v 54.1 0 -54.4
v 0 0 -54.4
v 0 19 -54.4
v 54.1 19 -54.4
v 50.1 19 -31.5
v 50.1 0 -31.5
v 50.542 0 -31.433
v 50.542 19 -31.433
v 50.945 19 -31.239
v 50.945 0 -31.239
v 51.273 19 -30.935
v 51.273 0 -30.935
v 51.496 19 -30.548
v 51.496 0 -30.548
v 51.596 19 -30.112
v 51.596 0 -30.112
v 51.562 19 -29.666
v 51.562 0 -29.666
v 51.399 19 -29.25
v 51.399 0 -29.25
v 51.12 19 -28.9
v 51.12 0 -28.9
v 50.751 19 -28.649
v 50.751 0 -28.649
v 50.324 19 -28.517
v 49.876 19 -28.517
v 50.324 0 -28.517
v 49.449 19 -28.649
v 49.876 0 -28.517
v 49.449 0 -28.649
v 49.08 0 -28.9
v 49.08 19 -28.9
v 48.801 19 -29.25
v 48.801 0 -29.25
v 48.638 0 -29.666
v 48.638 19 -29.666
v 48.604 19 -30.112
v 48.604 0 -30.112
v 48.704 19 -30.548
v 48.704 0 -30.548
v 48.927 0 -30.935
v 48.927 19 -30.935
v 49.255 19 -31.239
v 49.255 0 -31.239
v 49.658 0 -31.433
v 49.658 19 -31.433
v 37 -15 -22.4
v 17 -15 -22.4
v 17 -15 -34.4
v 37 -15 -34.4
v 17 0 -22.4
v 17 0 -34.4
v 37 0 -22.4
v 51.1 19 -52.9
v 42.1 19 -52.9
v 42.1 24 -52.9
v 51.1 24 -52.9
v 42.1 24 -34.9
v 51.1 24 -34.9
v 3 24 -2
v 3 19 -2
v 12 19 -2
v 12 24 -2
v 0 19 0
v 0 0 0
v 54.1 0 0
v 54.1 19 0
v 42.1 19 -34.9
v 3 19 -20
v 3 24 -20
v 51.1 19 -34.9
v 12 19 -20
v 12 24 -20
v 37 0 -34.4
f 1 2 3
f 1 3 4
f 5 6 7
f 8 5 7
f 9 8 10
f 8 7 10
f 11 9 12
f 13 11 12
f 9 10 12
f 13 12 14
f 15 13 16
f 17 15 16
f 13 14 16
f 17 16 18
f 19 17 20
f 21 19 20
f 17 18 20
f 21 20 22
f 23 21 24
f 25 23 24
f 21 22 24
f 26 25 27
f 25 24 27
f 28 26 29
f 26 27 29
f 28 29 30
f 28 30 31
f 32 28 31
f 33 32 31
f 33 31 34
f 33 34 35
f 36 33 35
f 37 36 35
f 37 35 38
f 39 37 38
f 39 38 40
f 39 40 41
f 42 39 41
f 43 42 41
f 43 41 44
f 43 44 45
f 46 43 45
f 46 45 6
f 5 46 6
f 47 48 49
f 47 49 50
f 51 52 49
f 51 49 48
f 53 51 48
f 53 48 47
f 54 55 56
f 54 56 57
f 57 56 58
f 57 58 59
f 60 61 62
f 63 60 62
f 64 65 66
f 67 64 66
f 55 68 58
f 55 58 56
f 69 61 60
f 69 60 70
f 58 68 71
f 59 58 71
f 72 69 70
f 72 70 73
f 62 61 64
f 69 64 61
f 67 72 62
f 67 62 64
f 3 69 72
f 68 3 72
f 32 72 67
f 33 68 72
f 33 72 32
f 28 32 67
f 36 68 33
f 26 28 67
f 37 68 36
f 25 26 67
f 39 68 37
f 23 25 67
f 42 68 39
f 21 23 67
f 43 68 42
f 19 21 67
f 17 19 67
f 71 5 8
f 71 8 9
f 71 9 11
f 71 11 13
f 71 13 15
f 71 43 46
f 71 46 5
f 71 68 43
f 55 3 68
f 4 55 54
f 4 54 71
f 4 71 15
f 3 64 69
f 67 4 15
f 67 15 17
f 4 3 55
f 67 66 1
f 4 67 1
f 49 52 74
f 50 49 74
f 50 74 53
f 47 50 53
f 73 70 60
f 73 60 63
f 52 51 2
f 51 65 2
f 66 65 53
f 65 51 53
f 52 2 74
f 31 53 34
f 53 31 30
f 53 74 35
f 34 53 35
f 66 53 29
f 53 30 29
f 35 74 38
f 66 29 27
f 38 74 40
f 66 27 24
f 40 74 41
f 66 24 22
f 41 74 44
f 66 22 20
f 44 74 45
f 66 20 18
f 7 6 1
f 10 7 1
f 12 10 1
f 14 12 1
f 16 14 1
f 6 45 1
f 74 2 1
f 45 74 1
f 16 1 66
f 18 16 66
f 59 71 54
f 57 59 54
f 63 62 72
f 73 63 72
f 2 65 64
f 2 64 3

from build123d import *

# Parameters (mm, degrees)
ESQUISSE1_W             = 54.1
ESQUISSE1_H             = 54.4
BOSS_EXTRU_1_DEPTH      = 19
ESQUISSE2_W             = 20
ESQUISSE2_H             = 12
BOSS_EXTRU_2_DEPTH      = 15
ESQUISSE3_W             = 9
ESQUISSE3_H             = 18
BOSS_EXTRU_3_DEPTH      = 5
ESQUISSE4_R             = 1.5
ENL_V_MAT_EXTRU_1_DEPTH = 81.387623426


with BuildPart() as part:
    # Esquisse1 → Boss.-Extru.1 (new body)
    with BuildSketch(Plane(origin=(0, 0, 0), x_dir=(1, 0, 0), z_dir=(0, 1, 0))):
        with Locations((27.05, 27.2)):
            Rectangle(ESQUISSE1_W, ESQUISSE1_H)
    extrude(amount=BOSS_EXTRU_1_DEPTH)

    # Esquisse2 → Boss.-Extru.2 (add)
    with BuildSketch(Plane.XZ):
        with Locations((27, -28.4)):
            Rectangle(ESQUISSE2_W, ESQUISSE2_H)
    extrude(amount=BOSS_EXTRU_2_DEPTH)

    # Esquisse3 → Boss.-Extru.3 (add)
    with BuildSketch(Plane(origin=(0, 19, 0), x_dir=(1, 0, 0), z_dir=(0, 1, 0))):
        with Locations((46.6, 43.9)):
            Rectangle(ESQUISSE3_W, ESQUISSE3_H)
        with Locations((7.5, 11)):
            Rectangle(ESQUISSE3_W, ESQUISSE3_H)
    extrude(amount=BOSS_EXTRU_3_DEPTH)

    # Esquisse4 → Enlèv. mat.-Extru.1 (cut, through all)
    with BuildSketch(Plane.XZ):
        with Locations(Location((50.1, -30, 0), (0, 0, 270))):
            Circle(ESQUISSE4_R)
    extrude(amount=-ENL_V_MAT_EXTRU_1_DEPTH, mode=Mode.SUBTRACT)


solid = part.part
